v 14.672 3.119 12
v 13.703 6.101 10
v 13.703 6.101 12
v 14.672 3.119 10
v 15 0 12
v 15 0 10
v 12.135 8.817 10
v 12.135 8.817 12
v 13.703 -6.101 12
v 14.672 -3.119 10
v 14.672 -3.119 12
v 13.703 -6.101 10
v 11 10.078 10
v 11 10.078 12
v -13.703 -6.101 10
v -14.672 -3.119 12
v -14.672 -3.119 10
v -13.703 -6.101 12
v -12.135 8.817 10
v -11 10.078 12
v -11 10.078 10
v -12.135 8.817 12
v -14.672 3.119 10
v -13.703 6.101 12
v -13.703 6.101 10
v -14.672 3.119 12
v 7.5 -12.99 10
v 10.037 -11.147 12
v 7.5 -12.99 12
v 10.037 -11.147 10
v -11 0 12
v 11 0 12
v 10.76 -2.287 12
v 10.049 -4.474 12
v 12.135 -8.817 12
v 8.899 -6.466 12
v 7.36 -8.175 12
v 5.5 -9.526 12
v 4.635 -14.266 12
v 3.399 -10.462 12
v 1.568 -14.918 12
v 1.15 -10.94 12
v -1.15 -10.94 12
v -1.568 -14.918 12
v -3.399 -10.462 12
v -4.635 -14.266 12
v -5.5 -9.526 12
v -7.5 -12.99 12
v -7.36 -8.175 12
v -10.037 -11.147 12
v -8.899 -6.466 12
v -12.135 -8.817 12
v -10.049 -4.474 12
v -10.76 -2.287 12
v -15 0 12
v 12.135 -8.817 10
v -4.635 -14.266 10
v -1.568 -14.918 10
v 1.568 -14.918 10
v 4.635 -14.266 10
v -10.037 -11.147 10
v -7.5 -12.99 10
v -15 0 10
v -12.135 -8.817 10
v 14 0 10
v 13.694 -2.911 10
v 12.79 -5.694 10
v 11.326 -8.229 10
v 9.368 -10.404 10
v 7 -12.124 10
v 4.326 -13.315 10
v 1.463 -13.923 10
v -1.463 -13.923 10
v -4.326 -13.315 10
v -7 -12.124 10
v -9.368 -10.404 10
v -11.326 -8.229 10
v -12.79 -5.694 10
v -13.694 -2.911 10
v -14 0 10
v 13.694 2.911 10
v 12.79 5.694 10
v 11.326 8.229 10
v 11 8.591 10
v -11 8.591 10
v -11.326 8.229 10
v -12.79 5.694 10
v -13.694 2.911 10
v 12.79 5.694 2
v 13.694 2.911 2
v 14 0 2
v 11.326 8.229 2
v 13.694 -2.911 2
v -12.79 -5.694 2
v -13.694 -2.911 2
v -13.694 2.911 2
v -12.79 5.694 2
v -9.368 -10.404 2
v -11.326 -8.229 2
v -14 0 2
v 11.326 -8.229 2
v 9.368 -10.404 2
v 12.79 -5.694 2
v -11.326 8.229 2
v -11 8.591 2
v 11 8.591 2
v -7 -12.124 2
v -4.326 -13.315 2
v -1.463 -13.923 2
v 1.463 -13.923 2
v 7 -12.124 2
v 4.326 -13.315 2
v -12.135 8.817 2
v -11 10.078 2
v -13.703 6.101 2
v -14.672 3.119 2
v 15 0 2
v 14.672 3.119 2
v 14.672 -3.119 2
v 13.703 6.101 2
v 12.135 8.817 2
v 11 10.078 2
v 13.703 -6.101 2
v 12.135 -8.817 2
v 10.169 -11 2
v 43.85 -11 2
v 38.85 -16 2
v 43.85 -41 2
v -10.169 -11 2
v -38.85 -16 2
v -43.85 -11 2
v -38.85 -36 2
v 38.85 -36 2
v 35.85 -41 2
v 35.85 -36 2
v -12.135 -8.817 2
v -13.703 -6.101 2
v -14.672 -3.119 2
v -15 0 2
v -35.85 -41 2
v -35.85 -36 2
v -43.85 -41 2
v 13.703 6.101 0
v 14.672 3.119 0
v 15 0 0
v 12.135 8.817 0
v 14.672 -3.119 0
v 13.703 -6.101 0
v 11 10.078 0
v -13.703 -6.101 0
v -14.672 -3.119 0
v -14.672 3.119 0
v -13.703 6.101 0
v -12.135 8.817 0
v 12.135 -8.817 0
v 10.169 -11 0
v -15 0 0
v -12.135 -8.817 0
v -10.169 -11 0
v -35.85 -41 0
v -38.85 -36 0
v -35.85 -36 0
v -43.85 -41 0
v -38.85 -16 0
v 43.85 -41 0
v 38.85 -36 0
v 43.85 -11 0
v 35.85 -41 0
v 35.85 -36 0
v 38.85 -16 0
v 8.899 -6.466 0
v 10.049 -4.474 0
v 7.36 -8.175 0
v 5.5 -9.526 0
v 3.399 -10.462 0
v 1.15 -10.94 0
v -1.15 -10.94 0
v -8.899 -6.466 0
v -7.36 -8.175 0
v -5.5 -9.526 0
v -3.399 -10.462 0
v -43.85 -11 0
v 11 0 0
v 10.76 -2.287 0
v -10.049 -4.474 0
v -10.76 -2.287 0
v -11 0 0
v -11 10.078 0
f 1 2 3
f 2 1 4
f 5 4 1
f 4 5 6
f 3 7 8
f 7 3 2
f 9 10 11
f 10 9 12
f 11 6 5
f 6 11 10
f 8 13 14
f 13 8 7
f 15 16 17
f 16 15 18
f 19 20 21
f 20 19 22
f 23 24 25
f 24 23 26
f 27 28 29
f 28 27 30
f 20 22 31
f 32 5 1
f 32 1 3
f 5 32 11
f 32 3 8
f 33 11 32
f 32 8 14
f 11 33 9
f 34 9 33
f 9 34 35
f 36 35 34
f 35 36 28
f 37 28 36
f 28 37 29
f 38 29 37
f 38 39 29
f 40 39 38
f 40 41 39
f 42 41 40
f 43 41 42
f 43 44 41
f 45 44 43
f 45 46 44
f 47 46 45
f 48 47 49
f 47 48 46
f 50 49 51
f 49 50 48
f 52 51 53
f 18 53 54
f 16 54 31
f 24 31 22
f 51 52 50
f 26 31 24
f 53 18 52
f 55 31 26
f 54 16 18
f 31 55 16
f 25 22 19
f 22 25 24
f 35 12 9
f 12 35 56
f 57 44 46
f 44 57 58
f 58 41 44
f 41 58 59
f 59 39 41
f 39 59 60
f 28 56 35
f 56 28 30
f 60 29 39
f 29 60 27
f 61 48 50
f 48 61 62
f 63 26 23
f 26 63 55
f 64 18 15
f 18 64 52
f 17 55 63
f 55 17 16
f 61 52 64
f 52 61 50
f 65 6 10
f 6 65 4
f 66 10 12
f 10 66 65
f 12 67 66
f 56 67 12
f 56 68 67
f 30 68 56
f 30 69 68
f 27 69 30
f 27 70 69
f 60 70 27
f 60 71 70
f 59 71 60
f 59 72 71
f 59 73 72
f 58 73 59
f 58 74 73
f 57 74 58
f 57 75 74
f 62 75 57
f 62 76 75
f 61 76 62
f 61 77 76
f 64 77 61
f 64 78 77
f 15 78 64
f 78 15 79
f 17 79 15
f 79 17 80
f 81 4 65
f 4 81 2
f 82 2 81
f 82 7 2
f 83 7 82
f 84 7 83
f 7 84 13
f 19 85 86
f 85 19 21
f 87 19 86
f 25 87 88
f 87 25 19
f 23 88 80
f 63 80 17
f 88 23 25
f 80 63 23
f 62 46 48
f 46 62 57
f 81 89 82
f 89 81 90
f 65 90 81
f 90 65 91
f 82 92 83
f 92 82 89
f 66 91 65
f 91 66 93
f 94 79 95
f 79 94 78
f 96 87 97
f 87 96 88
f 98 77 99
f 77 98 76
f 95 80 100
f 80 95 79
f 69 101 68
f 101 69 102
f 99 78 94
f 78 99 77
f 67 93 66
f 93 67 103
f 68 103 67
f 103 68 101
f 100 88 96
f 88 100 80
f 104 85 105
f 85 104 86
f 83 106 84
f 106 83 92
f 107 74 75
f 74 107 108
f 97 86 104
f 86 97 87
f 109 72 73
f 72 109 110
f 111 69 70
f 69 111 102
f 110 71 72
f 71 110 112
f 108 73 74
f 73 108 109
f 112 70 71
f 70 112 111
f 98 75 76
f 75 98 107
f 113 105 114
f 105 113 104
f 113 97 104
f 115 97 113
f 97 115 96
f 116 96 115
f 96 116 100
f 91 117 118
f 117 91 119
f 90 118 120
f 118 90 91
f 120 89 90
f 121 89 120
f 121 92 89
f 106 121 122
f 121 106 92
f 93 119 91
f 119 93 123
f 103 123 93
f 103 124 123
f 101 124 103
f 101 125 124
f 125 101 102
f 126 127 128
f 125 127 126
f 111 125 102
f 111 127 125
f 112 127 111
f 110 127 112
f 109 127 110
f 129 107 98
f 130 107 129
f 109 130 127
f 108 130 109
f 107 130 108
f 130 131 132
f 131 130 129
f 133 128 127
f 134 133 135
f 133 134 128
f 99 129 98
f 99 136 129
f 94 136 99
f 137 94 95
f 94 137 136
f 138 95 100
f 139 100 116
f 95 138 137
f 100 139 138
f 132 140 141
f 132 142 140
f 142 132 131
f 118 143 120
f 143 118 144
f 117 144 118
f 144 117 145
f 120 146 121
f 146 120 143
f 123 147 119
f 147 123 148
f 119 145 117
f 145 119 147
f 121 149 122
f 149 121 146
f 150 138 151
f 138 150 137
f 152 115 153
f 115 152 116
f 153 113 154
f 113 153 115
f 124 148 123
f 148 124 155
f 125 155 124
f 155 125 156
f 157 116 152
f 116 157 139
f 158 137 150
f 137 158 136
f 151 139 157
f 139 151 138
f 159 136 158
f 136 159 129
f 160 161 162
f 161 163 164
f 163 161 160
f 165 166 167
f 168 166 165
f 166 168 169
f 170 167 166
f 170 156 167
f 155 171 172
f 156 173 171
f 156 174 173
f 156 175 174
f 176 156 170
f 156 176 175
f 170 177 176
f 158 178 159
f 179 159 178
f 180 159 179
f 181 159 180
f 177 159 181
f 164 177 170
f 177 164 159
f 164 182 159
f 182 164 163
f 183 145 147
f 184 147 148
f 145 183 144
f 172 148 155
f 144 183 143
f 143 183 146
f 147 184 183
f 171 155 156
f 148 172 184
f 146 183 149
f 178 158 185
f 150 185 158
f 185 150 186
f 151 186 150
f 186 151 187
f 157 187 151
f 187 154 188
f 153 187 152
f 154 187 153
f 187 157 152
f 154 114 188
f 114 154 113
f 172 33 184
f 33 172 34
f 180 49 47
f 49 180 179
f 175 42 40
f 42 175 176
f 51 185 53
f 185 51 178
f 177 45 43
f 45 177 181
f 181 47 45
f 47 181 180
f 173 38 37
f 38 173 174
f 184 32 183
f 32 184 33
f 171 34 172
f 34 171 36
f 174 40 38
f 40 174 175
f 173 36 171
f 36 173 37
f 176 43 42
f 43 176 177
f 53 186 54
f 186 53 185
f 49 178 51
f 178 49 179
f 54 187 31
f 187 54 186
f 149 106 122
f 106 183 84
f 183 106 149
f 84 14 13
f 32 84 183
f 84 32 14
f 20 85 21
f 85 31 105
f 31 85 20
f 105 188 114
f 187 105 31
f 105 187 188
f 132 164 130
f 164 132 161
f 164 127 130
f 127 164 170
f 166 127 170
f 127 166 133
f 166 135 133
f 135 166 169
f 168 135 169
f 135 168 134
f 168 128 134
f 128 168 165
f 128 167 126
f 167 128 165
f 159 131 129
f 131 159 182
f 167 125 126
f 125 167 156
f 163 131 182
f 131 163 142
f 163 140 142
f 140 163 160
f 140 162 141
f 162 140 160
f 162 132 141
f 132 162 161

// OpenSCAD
phone_width = 77.7; // [20:200]
phone_thickness = 20; // [5:100]
arm_width = 5; // [1:20]
finger_length = 3; // [2:20]
ziptie_width = 8; // [2:20]
bike_tube_size = 11; // [5:40]

difference(){
    union() {
        translate([0, 0, ziptie_width+2]) cylinder(2, bike_tube_size+4, bike_tube_size+4);
        translate([0, 0, 2]) cylinder(ziptie_width, bike_tube_size+3, bike_tube_size+3);
        cylinder(2, bike_tube_size+4, bike_tube_size+4);
    }
    cylinder(50, bike_tube_size, bike_tube_size, true);
    translate([0, bike_tube_size, 0]) cube([bike_tube_size*2,bike_tube_size*2,50], true);
};



translate([-phone_width/2, -bike_tube_size-phone_thickness-arm_width, 0]) linear_extrude(2) difference(){
    translate([-arm_width, -arm_width, 0])
        square([phone_width+arm_width*2,phone_thickness+arm_width*2]);
    square([phone_width,phone_thickness]);
    translate([finger_length, -arm_width, 0]) square([phone_width-finger_length*2,arm_width]);
}
